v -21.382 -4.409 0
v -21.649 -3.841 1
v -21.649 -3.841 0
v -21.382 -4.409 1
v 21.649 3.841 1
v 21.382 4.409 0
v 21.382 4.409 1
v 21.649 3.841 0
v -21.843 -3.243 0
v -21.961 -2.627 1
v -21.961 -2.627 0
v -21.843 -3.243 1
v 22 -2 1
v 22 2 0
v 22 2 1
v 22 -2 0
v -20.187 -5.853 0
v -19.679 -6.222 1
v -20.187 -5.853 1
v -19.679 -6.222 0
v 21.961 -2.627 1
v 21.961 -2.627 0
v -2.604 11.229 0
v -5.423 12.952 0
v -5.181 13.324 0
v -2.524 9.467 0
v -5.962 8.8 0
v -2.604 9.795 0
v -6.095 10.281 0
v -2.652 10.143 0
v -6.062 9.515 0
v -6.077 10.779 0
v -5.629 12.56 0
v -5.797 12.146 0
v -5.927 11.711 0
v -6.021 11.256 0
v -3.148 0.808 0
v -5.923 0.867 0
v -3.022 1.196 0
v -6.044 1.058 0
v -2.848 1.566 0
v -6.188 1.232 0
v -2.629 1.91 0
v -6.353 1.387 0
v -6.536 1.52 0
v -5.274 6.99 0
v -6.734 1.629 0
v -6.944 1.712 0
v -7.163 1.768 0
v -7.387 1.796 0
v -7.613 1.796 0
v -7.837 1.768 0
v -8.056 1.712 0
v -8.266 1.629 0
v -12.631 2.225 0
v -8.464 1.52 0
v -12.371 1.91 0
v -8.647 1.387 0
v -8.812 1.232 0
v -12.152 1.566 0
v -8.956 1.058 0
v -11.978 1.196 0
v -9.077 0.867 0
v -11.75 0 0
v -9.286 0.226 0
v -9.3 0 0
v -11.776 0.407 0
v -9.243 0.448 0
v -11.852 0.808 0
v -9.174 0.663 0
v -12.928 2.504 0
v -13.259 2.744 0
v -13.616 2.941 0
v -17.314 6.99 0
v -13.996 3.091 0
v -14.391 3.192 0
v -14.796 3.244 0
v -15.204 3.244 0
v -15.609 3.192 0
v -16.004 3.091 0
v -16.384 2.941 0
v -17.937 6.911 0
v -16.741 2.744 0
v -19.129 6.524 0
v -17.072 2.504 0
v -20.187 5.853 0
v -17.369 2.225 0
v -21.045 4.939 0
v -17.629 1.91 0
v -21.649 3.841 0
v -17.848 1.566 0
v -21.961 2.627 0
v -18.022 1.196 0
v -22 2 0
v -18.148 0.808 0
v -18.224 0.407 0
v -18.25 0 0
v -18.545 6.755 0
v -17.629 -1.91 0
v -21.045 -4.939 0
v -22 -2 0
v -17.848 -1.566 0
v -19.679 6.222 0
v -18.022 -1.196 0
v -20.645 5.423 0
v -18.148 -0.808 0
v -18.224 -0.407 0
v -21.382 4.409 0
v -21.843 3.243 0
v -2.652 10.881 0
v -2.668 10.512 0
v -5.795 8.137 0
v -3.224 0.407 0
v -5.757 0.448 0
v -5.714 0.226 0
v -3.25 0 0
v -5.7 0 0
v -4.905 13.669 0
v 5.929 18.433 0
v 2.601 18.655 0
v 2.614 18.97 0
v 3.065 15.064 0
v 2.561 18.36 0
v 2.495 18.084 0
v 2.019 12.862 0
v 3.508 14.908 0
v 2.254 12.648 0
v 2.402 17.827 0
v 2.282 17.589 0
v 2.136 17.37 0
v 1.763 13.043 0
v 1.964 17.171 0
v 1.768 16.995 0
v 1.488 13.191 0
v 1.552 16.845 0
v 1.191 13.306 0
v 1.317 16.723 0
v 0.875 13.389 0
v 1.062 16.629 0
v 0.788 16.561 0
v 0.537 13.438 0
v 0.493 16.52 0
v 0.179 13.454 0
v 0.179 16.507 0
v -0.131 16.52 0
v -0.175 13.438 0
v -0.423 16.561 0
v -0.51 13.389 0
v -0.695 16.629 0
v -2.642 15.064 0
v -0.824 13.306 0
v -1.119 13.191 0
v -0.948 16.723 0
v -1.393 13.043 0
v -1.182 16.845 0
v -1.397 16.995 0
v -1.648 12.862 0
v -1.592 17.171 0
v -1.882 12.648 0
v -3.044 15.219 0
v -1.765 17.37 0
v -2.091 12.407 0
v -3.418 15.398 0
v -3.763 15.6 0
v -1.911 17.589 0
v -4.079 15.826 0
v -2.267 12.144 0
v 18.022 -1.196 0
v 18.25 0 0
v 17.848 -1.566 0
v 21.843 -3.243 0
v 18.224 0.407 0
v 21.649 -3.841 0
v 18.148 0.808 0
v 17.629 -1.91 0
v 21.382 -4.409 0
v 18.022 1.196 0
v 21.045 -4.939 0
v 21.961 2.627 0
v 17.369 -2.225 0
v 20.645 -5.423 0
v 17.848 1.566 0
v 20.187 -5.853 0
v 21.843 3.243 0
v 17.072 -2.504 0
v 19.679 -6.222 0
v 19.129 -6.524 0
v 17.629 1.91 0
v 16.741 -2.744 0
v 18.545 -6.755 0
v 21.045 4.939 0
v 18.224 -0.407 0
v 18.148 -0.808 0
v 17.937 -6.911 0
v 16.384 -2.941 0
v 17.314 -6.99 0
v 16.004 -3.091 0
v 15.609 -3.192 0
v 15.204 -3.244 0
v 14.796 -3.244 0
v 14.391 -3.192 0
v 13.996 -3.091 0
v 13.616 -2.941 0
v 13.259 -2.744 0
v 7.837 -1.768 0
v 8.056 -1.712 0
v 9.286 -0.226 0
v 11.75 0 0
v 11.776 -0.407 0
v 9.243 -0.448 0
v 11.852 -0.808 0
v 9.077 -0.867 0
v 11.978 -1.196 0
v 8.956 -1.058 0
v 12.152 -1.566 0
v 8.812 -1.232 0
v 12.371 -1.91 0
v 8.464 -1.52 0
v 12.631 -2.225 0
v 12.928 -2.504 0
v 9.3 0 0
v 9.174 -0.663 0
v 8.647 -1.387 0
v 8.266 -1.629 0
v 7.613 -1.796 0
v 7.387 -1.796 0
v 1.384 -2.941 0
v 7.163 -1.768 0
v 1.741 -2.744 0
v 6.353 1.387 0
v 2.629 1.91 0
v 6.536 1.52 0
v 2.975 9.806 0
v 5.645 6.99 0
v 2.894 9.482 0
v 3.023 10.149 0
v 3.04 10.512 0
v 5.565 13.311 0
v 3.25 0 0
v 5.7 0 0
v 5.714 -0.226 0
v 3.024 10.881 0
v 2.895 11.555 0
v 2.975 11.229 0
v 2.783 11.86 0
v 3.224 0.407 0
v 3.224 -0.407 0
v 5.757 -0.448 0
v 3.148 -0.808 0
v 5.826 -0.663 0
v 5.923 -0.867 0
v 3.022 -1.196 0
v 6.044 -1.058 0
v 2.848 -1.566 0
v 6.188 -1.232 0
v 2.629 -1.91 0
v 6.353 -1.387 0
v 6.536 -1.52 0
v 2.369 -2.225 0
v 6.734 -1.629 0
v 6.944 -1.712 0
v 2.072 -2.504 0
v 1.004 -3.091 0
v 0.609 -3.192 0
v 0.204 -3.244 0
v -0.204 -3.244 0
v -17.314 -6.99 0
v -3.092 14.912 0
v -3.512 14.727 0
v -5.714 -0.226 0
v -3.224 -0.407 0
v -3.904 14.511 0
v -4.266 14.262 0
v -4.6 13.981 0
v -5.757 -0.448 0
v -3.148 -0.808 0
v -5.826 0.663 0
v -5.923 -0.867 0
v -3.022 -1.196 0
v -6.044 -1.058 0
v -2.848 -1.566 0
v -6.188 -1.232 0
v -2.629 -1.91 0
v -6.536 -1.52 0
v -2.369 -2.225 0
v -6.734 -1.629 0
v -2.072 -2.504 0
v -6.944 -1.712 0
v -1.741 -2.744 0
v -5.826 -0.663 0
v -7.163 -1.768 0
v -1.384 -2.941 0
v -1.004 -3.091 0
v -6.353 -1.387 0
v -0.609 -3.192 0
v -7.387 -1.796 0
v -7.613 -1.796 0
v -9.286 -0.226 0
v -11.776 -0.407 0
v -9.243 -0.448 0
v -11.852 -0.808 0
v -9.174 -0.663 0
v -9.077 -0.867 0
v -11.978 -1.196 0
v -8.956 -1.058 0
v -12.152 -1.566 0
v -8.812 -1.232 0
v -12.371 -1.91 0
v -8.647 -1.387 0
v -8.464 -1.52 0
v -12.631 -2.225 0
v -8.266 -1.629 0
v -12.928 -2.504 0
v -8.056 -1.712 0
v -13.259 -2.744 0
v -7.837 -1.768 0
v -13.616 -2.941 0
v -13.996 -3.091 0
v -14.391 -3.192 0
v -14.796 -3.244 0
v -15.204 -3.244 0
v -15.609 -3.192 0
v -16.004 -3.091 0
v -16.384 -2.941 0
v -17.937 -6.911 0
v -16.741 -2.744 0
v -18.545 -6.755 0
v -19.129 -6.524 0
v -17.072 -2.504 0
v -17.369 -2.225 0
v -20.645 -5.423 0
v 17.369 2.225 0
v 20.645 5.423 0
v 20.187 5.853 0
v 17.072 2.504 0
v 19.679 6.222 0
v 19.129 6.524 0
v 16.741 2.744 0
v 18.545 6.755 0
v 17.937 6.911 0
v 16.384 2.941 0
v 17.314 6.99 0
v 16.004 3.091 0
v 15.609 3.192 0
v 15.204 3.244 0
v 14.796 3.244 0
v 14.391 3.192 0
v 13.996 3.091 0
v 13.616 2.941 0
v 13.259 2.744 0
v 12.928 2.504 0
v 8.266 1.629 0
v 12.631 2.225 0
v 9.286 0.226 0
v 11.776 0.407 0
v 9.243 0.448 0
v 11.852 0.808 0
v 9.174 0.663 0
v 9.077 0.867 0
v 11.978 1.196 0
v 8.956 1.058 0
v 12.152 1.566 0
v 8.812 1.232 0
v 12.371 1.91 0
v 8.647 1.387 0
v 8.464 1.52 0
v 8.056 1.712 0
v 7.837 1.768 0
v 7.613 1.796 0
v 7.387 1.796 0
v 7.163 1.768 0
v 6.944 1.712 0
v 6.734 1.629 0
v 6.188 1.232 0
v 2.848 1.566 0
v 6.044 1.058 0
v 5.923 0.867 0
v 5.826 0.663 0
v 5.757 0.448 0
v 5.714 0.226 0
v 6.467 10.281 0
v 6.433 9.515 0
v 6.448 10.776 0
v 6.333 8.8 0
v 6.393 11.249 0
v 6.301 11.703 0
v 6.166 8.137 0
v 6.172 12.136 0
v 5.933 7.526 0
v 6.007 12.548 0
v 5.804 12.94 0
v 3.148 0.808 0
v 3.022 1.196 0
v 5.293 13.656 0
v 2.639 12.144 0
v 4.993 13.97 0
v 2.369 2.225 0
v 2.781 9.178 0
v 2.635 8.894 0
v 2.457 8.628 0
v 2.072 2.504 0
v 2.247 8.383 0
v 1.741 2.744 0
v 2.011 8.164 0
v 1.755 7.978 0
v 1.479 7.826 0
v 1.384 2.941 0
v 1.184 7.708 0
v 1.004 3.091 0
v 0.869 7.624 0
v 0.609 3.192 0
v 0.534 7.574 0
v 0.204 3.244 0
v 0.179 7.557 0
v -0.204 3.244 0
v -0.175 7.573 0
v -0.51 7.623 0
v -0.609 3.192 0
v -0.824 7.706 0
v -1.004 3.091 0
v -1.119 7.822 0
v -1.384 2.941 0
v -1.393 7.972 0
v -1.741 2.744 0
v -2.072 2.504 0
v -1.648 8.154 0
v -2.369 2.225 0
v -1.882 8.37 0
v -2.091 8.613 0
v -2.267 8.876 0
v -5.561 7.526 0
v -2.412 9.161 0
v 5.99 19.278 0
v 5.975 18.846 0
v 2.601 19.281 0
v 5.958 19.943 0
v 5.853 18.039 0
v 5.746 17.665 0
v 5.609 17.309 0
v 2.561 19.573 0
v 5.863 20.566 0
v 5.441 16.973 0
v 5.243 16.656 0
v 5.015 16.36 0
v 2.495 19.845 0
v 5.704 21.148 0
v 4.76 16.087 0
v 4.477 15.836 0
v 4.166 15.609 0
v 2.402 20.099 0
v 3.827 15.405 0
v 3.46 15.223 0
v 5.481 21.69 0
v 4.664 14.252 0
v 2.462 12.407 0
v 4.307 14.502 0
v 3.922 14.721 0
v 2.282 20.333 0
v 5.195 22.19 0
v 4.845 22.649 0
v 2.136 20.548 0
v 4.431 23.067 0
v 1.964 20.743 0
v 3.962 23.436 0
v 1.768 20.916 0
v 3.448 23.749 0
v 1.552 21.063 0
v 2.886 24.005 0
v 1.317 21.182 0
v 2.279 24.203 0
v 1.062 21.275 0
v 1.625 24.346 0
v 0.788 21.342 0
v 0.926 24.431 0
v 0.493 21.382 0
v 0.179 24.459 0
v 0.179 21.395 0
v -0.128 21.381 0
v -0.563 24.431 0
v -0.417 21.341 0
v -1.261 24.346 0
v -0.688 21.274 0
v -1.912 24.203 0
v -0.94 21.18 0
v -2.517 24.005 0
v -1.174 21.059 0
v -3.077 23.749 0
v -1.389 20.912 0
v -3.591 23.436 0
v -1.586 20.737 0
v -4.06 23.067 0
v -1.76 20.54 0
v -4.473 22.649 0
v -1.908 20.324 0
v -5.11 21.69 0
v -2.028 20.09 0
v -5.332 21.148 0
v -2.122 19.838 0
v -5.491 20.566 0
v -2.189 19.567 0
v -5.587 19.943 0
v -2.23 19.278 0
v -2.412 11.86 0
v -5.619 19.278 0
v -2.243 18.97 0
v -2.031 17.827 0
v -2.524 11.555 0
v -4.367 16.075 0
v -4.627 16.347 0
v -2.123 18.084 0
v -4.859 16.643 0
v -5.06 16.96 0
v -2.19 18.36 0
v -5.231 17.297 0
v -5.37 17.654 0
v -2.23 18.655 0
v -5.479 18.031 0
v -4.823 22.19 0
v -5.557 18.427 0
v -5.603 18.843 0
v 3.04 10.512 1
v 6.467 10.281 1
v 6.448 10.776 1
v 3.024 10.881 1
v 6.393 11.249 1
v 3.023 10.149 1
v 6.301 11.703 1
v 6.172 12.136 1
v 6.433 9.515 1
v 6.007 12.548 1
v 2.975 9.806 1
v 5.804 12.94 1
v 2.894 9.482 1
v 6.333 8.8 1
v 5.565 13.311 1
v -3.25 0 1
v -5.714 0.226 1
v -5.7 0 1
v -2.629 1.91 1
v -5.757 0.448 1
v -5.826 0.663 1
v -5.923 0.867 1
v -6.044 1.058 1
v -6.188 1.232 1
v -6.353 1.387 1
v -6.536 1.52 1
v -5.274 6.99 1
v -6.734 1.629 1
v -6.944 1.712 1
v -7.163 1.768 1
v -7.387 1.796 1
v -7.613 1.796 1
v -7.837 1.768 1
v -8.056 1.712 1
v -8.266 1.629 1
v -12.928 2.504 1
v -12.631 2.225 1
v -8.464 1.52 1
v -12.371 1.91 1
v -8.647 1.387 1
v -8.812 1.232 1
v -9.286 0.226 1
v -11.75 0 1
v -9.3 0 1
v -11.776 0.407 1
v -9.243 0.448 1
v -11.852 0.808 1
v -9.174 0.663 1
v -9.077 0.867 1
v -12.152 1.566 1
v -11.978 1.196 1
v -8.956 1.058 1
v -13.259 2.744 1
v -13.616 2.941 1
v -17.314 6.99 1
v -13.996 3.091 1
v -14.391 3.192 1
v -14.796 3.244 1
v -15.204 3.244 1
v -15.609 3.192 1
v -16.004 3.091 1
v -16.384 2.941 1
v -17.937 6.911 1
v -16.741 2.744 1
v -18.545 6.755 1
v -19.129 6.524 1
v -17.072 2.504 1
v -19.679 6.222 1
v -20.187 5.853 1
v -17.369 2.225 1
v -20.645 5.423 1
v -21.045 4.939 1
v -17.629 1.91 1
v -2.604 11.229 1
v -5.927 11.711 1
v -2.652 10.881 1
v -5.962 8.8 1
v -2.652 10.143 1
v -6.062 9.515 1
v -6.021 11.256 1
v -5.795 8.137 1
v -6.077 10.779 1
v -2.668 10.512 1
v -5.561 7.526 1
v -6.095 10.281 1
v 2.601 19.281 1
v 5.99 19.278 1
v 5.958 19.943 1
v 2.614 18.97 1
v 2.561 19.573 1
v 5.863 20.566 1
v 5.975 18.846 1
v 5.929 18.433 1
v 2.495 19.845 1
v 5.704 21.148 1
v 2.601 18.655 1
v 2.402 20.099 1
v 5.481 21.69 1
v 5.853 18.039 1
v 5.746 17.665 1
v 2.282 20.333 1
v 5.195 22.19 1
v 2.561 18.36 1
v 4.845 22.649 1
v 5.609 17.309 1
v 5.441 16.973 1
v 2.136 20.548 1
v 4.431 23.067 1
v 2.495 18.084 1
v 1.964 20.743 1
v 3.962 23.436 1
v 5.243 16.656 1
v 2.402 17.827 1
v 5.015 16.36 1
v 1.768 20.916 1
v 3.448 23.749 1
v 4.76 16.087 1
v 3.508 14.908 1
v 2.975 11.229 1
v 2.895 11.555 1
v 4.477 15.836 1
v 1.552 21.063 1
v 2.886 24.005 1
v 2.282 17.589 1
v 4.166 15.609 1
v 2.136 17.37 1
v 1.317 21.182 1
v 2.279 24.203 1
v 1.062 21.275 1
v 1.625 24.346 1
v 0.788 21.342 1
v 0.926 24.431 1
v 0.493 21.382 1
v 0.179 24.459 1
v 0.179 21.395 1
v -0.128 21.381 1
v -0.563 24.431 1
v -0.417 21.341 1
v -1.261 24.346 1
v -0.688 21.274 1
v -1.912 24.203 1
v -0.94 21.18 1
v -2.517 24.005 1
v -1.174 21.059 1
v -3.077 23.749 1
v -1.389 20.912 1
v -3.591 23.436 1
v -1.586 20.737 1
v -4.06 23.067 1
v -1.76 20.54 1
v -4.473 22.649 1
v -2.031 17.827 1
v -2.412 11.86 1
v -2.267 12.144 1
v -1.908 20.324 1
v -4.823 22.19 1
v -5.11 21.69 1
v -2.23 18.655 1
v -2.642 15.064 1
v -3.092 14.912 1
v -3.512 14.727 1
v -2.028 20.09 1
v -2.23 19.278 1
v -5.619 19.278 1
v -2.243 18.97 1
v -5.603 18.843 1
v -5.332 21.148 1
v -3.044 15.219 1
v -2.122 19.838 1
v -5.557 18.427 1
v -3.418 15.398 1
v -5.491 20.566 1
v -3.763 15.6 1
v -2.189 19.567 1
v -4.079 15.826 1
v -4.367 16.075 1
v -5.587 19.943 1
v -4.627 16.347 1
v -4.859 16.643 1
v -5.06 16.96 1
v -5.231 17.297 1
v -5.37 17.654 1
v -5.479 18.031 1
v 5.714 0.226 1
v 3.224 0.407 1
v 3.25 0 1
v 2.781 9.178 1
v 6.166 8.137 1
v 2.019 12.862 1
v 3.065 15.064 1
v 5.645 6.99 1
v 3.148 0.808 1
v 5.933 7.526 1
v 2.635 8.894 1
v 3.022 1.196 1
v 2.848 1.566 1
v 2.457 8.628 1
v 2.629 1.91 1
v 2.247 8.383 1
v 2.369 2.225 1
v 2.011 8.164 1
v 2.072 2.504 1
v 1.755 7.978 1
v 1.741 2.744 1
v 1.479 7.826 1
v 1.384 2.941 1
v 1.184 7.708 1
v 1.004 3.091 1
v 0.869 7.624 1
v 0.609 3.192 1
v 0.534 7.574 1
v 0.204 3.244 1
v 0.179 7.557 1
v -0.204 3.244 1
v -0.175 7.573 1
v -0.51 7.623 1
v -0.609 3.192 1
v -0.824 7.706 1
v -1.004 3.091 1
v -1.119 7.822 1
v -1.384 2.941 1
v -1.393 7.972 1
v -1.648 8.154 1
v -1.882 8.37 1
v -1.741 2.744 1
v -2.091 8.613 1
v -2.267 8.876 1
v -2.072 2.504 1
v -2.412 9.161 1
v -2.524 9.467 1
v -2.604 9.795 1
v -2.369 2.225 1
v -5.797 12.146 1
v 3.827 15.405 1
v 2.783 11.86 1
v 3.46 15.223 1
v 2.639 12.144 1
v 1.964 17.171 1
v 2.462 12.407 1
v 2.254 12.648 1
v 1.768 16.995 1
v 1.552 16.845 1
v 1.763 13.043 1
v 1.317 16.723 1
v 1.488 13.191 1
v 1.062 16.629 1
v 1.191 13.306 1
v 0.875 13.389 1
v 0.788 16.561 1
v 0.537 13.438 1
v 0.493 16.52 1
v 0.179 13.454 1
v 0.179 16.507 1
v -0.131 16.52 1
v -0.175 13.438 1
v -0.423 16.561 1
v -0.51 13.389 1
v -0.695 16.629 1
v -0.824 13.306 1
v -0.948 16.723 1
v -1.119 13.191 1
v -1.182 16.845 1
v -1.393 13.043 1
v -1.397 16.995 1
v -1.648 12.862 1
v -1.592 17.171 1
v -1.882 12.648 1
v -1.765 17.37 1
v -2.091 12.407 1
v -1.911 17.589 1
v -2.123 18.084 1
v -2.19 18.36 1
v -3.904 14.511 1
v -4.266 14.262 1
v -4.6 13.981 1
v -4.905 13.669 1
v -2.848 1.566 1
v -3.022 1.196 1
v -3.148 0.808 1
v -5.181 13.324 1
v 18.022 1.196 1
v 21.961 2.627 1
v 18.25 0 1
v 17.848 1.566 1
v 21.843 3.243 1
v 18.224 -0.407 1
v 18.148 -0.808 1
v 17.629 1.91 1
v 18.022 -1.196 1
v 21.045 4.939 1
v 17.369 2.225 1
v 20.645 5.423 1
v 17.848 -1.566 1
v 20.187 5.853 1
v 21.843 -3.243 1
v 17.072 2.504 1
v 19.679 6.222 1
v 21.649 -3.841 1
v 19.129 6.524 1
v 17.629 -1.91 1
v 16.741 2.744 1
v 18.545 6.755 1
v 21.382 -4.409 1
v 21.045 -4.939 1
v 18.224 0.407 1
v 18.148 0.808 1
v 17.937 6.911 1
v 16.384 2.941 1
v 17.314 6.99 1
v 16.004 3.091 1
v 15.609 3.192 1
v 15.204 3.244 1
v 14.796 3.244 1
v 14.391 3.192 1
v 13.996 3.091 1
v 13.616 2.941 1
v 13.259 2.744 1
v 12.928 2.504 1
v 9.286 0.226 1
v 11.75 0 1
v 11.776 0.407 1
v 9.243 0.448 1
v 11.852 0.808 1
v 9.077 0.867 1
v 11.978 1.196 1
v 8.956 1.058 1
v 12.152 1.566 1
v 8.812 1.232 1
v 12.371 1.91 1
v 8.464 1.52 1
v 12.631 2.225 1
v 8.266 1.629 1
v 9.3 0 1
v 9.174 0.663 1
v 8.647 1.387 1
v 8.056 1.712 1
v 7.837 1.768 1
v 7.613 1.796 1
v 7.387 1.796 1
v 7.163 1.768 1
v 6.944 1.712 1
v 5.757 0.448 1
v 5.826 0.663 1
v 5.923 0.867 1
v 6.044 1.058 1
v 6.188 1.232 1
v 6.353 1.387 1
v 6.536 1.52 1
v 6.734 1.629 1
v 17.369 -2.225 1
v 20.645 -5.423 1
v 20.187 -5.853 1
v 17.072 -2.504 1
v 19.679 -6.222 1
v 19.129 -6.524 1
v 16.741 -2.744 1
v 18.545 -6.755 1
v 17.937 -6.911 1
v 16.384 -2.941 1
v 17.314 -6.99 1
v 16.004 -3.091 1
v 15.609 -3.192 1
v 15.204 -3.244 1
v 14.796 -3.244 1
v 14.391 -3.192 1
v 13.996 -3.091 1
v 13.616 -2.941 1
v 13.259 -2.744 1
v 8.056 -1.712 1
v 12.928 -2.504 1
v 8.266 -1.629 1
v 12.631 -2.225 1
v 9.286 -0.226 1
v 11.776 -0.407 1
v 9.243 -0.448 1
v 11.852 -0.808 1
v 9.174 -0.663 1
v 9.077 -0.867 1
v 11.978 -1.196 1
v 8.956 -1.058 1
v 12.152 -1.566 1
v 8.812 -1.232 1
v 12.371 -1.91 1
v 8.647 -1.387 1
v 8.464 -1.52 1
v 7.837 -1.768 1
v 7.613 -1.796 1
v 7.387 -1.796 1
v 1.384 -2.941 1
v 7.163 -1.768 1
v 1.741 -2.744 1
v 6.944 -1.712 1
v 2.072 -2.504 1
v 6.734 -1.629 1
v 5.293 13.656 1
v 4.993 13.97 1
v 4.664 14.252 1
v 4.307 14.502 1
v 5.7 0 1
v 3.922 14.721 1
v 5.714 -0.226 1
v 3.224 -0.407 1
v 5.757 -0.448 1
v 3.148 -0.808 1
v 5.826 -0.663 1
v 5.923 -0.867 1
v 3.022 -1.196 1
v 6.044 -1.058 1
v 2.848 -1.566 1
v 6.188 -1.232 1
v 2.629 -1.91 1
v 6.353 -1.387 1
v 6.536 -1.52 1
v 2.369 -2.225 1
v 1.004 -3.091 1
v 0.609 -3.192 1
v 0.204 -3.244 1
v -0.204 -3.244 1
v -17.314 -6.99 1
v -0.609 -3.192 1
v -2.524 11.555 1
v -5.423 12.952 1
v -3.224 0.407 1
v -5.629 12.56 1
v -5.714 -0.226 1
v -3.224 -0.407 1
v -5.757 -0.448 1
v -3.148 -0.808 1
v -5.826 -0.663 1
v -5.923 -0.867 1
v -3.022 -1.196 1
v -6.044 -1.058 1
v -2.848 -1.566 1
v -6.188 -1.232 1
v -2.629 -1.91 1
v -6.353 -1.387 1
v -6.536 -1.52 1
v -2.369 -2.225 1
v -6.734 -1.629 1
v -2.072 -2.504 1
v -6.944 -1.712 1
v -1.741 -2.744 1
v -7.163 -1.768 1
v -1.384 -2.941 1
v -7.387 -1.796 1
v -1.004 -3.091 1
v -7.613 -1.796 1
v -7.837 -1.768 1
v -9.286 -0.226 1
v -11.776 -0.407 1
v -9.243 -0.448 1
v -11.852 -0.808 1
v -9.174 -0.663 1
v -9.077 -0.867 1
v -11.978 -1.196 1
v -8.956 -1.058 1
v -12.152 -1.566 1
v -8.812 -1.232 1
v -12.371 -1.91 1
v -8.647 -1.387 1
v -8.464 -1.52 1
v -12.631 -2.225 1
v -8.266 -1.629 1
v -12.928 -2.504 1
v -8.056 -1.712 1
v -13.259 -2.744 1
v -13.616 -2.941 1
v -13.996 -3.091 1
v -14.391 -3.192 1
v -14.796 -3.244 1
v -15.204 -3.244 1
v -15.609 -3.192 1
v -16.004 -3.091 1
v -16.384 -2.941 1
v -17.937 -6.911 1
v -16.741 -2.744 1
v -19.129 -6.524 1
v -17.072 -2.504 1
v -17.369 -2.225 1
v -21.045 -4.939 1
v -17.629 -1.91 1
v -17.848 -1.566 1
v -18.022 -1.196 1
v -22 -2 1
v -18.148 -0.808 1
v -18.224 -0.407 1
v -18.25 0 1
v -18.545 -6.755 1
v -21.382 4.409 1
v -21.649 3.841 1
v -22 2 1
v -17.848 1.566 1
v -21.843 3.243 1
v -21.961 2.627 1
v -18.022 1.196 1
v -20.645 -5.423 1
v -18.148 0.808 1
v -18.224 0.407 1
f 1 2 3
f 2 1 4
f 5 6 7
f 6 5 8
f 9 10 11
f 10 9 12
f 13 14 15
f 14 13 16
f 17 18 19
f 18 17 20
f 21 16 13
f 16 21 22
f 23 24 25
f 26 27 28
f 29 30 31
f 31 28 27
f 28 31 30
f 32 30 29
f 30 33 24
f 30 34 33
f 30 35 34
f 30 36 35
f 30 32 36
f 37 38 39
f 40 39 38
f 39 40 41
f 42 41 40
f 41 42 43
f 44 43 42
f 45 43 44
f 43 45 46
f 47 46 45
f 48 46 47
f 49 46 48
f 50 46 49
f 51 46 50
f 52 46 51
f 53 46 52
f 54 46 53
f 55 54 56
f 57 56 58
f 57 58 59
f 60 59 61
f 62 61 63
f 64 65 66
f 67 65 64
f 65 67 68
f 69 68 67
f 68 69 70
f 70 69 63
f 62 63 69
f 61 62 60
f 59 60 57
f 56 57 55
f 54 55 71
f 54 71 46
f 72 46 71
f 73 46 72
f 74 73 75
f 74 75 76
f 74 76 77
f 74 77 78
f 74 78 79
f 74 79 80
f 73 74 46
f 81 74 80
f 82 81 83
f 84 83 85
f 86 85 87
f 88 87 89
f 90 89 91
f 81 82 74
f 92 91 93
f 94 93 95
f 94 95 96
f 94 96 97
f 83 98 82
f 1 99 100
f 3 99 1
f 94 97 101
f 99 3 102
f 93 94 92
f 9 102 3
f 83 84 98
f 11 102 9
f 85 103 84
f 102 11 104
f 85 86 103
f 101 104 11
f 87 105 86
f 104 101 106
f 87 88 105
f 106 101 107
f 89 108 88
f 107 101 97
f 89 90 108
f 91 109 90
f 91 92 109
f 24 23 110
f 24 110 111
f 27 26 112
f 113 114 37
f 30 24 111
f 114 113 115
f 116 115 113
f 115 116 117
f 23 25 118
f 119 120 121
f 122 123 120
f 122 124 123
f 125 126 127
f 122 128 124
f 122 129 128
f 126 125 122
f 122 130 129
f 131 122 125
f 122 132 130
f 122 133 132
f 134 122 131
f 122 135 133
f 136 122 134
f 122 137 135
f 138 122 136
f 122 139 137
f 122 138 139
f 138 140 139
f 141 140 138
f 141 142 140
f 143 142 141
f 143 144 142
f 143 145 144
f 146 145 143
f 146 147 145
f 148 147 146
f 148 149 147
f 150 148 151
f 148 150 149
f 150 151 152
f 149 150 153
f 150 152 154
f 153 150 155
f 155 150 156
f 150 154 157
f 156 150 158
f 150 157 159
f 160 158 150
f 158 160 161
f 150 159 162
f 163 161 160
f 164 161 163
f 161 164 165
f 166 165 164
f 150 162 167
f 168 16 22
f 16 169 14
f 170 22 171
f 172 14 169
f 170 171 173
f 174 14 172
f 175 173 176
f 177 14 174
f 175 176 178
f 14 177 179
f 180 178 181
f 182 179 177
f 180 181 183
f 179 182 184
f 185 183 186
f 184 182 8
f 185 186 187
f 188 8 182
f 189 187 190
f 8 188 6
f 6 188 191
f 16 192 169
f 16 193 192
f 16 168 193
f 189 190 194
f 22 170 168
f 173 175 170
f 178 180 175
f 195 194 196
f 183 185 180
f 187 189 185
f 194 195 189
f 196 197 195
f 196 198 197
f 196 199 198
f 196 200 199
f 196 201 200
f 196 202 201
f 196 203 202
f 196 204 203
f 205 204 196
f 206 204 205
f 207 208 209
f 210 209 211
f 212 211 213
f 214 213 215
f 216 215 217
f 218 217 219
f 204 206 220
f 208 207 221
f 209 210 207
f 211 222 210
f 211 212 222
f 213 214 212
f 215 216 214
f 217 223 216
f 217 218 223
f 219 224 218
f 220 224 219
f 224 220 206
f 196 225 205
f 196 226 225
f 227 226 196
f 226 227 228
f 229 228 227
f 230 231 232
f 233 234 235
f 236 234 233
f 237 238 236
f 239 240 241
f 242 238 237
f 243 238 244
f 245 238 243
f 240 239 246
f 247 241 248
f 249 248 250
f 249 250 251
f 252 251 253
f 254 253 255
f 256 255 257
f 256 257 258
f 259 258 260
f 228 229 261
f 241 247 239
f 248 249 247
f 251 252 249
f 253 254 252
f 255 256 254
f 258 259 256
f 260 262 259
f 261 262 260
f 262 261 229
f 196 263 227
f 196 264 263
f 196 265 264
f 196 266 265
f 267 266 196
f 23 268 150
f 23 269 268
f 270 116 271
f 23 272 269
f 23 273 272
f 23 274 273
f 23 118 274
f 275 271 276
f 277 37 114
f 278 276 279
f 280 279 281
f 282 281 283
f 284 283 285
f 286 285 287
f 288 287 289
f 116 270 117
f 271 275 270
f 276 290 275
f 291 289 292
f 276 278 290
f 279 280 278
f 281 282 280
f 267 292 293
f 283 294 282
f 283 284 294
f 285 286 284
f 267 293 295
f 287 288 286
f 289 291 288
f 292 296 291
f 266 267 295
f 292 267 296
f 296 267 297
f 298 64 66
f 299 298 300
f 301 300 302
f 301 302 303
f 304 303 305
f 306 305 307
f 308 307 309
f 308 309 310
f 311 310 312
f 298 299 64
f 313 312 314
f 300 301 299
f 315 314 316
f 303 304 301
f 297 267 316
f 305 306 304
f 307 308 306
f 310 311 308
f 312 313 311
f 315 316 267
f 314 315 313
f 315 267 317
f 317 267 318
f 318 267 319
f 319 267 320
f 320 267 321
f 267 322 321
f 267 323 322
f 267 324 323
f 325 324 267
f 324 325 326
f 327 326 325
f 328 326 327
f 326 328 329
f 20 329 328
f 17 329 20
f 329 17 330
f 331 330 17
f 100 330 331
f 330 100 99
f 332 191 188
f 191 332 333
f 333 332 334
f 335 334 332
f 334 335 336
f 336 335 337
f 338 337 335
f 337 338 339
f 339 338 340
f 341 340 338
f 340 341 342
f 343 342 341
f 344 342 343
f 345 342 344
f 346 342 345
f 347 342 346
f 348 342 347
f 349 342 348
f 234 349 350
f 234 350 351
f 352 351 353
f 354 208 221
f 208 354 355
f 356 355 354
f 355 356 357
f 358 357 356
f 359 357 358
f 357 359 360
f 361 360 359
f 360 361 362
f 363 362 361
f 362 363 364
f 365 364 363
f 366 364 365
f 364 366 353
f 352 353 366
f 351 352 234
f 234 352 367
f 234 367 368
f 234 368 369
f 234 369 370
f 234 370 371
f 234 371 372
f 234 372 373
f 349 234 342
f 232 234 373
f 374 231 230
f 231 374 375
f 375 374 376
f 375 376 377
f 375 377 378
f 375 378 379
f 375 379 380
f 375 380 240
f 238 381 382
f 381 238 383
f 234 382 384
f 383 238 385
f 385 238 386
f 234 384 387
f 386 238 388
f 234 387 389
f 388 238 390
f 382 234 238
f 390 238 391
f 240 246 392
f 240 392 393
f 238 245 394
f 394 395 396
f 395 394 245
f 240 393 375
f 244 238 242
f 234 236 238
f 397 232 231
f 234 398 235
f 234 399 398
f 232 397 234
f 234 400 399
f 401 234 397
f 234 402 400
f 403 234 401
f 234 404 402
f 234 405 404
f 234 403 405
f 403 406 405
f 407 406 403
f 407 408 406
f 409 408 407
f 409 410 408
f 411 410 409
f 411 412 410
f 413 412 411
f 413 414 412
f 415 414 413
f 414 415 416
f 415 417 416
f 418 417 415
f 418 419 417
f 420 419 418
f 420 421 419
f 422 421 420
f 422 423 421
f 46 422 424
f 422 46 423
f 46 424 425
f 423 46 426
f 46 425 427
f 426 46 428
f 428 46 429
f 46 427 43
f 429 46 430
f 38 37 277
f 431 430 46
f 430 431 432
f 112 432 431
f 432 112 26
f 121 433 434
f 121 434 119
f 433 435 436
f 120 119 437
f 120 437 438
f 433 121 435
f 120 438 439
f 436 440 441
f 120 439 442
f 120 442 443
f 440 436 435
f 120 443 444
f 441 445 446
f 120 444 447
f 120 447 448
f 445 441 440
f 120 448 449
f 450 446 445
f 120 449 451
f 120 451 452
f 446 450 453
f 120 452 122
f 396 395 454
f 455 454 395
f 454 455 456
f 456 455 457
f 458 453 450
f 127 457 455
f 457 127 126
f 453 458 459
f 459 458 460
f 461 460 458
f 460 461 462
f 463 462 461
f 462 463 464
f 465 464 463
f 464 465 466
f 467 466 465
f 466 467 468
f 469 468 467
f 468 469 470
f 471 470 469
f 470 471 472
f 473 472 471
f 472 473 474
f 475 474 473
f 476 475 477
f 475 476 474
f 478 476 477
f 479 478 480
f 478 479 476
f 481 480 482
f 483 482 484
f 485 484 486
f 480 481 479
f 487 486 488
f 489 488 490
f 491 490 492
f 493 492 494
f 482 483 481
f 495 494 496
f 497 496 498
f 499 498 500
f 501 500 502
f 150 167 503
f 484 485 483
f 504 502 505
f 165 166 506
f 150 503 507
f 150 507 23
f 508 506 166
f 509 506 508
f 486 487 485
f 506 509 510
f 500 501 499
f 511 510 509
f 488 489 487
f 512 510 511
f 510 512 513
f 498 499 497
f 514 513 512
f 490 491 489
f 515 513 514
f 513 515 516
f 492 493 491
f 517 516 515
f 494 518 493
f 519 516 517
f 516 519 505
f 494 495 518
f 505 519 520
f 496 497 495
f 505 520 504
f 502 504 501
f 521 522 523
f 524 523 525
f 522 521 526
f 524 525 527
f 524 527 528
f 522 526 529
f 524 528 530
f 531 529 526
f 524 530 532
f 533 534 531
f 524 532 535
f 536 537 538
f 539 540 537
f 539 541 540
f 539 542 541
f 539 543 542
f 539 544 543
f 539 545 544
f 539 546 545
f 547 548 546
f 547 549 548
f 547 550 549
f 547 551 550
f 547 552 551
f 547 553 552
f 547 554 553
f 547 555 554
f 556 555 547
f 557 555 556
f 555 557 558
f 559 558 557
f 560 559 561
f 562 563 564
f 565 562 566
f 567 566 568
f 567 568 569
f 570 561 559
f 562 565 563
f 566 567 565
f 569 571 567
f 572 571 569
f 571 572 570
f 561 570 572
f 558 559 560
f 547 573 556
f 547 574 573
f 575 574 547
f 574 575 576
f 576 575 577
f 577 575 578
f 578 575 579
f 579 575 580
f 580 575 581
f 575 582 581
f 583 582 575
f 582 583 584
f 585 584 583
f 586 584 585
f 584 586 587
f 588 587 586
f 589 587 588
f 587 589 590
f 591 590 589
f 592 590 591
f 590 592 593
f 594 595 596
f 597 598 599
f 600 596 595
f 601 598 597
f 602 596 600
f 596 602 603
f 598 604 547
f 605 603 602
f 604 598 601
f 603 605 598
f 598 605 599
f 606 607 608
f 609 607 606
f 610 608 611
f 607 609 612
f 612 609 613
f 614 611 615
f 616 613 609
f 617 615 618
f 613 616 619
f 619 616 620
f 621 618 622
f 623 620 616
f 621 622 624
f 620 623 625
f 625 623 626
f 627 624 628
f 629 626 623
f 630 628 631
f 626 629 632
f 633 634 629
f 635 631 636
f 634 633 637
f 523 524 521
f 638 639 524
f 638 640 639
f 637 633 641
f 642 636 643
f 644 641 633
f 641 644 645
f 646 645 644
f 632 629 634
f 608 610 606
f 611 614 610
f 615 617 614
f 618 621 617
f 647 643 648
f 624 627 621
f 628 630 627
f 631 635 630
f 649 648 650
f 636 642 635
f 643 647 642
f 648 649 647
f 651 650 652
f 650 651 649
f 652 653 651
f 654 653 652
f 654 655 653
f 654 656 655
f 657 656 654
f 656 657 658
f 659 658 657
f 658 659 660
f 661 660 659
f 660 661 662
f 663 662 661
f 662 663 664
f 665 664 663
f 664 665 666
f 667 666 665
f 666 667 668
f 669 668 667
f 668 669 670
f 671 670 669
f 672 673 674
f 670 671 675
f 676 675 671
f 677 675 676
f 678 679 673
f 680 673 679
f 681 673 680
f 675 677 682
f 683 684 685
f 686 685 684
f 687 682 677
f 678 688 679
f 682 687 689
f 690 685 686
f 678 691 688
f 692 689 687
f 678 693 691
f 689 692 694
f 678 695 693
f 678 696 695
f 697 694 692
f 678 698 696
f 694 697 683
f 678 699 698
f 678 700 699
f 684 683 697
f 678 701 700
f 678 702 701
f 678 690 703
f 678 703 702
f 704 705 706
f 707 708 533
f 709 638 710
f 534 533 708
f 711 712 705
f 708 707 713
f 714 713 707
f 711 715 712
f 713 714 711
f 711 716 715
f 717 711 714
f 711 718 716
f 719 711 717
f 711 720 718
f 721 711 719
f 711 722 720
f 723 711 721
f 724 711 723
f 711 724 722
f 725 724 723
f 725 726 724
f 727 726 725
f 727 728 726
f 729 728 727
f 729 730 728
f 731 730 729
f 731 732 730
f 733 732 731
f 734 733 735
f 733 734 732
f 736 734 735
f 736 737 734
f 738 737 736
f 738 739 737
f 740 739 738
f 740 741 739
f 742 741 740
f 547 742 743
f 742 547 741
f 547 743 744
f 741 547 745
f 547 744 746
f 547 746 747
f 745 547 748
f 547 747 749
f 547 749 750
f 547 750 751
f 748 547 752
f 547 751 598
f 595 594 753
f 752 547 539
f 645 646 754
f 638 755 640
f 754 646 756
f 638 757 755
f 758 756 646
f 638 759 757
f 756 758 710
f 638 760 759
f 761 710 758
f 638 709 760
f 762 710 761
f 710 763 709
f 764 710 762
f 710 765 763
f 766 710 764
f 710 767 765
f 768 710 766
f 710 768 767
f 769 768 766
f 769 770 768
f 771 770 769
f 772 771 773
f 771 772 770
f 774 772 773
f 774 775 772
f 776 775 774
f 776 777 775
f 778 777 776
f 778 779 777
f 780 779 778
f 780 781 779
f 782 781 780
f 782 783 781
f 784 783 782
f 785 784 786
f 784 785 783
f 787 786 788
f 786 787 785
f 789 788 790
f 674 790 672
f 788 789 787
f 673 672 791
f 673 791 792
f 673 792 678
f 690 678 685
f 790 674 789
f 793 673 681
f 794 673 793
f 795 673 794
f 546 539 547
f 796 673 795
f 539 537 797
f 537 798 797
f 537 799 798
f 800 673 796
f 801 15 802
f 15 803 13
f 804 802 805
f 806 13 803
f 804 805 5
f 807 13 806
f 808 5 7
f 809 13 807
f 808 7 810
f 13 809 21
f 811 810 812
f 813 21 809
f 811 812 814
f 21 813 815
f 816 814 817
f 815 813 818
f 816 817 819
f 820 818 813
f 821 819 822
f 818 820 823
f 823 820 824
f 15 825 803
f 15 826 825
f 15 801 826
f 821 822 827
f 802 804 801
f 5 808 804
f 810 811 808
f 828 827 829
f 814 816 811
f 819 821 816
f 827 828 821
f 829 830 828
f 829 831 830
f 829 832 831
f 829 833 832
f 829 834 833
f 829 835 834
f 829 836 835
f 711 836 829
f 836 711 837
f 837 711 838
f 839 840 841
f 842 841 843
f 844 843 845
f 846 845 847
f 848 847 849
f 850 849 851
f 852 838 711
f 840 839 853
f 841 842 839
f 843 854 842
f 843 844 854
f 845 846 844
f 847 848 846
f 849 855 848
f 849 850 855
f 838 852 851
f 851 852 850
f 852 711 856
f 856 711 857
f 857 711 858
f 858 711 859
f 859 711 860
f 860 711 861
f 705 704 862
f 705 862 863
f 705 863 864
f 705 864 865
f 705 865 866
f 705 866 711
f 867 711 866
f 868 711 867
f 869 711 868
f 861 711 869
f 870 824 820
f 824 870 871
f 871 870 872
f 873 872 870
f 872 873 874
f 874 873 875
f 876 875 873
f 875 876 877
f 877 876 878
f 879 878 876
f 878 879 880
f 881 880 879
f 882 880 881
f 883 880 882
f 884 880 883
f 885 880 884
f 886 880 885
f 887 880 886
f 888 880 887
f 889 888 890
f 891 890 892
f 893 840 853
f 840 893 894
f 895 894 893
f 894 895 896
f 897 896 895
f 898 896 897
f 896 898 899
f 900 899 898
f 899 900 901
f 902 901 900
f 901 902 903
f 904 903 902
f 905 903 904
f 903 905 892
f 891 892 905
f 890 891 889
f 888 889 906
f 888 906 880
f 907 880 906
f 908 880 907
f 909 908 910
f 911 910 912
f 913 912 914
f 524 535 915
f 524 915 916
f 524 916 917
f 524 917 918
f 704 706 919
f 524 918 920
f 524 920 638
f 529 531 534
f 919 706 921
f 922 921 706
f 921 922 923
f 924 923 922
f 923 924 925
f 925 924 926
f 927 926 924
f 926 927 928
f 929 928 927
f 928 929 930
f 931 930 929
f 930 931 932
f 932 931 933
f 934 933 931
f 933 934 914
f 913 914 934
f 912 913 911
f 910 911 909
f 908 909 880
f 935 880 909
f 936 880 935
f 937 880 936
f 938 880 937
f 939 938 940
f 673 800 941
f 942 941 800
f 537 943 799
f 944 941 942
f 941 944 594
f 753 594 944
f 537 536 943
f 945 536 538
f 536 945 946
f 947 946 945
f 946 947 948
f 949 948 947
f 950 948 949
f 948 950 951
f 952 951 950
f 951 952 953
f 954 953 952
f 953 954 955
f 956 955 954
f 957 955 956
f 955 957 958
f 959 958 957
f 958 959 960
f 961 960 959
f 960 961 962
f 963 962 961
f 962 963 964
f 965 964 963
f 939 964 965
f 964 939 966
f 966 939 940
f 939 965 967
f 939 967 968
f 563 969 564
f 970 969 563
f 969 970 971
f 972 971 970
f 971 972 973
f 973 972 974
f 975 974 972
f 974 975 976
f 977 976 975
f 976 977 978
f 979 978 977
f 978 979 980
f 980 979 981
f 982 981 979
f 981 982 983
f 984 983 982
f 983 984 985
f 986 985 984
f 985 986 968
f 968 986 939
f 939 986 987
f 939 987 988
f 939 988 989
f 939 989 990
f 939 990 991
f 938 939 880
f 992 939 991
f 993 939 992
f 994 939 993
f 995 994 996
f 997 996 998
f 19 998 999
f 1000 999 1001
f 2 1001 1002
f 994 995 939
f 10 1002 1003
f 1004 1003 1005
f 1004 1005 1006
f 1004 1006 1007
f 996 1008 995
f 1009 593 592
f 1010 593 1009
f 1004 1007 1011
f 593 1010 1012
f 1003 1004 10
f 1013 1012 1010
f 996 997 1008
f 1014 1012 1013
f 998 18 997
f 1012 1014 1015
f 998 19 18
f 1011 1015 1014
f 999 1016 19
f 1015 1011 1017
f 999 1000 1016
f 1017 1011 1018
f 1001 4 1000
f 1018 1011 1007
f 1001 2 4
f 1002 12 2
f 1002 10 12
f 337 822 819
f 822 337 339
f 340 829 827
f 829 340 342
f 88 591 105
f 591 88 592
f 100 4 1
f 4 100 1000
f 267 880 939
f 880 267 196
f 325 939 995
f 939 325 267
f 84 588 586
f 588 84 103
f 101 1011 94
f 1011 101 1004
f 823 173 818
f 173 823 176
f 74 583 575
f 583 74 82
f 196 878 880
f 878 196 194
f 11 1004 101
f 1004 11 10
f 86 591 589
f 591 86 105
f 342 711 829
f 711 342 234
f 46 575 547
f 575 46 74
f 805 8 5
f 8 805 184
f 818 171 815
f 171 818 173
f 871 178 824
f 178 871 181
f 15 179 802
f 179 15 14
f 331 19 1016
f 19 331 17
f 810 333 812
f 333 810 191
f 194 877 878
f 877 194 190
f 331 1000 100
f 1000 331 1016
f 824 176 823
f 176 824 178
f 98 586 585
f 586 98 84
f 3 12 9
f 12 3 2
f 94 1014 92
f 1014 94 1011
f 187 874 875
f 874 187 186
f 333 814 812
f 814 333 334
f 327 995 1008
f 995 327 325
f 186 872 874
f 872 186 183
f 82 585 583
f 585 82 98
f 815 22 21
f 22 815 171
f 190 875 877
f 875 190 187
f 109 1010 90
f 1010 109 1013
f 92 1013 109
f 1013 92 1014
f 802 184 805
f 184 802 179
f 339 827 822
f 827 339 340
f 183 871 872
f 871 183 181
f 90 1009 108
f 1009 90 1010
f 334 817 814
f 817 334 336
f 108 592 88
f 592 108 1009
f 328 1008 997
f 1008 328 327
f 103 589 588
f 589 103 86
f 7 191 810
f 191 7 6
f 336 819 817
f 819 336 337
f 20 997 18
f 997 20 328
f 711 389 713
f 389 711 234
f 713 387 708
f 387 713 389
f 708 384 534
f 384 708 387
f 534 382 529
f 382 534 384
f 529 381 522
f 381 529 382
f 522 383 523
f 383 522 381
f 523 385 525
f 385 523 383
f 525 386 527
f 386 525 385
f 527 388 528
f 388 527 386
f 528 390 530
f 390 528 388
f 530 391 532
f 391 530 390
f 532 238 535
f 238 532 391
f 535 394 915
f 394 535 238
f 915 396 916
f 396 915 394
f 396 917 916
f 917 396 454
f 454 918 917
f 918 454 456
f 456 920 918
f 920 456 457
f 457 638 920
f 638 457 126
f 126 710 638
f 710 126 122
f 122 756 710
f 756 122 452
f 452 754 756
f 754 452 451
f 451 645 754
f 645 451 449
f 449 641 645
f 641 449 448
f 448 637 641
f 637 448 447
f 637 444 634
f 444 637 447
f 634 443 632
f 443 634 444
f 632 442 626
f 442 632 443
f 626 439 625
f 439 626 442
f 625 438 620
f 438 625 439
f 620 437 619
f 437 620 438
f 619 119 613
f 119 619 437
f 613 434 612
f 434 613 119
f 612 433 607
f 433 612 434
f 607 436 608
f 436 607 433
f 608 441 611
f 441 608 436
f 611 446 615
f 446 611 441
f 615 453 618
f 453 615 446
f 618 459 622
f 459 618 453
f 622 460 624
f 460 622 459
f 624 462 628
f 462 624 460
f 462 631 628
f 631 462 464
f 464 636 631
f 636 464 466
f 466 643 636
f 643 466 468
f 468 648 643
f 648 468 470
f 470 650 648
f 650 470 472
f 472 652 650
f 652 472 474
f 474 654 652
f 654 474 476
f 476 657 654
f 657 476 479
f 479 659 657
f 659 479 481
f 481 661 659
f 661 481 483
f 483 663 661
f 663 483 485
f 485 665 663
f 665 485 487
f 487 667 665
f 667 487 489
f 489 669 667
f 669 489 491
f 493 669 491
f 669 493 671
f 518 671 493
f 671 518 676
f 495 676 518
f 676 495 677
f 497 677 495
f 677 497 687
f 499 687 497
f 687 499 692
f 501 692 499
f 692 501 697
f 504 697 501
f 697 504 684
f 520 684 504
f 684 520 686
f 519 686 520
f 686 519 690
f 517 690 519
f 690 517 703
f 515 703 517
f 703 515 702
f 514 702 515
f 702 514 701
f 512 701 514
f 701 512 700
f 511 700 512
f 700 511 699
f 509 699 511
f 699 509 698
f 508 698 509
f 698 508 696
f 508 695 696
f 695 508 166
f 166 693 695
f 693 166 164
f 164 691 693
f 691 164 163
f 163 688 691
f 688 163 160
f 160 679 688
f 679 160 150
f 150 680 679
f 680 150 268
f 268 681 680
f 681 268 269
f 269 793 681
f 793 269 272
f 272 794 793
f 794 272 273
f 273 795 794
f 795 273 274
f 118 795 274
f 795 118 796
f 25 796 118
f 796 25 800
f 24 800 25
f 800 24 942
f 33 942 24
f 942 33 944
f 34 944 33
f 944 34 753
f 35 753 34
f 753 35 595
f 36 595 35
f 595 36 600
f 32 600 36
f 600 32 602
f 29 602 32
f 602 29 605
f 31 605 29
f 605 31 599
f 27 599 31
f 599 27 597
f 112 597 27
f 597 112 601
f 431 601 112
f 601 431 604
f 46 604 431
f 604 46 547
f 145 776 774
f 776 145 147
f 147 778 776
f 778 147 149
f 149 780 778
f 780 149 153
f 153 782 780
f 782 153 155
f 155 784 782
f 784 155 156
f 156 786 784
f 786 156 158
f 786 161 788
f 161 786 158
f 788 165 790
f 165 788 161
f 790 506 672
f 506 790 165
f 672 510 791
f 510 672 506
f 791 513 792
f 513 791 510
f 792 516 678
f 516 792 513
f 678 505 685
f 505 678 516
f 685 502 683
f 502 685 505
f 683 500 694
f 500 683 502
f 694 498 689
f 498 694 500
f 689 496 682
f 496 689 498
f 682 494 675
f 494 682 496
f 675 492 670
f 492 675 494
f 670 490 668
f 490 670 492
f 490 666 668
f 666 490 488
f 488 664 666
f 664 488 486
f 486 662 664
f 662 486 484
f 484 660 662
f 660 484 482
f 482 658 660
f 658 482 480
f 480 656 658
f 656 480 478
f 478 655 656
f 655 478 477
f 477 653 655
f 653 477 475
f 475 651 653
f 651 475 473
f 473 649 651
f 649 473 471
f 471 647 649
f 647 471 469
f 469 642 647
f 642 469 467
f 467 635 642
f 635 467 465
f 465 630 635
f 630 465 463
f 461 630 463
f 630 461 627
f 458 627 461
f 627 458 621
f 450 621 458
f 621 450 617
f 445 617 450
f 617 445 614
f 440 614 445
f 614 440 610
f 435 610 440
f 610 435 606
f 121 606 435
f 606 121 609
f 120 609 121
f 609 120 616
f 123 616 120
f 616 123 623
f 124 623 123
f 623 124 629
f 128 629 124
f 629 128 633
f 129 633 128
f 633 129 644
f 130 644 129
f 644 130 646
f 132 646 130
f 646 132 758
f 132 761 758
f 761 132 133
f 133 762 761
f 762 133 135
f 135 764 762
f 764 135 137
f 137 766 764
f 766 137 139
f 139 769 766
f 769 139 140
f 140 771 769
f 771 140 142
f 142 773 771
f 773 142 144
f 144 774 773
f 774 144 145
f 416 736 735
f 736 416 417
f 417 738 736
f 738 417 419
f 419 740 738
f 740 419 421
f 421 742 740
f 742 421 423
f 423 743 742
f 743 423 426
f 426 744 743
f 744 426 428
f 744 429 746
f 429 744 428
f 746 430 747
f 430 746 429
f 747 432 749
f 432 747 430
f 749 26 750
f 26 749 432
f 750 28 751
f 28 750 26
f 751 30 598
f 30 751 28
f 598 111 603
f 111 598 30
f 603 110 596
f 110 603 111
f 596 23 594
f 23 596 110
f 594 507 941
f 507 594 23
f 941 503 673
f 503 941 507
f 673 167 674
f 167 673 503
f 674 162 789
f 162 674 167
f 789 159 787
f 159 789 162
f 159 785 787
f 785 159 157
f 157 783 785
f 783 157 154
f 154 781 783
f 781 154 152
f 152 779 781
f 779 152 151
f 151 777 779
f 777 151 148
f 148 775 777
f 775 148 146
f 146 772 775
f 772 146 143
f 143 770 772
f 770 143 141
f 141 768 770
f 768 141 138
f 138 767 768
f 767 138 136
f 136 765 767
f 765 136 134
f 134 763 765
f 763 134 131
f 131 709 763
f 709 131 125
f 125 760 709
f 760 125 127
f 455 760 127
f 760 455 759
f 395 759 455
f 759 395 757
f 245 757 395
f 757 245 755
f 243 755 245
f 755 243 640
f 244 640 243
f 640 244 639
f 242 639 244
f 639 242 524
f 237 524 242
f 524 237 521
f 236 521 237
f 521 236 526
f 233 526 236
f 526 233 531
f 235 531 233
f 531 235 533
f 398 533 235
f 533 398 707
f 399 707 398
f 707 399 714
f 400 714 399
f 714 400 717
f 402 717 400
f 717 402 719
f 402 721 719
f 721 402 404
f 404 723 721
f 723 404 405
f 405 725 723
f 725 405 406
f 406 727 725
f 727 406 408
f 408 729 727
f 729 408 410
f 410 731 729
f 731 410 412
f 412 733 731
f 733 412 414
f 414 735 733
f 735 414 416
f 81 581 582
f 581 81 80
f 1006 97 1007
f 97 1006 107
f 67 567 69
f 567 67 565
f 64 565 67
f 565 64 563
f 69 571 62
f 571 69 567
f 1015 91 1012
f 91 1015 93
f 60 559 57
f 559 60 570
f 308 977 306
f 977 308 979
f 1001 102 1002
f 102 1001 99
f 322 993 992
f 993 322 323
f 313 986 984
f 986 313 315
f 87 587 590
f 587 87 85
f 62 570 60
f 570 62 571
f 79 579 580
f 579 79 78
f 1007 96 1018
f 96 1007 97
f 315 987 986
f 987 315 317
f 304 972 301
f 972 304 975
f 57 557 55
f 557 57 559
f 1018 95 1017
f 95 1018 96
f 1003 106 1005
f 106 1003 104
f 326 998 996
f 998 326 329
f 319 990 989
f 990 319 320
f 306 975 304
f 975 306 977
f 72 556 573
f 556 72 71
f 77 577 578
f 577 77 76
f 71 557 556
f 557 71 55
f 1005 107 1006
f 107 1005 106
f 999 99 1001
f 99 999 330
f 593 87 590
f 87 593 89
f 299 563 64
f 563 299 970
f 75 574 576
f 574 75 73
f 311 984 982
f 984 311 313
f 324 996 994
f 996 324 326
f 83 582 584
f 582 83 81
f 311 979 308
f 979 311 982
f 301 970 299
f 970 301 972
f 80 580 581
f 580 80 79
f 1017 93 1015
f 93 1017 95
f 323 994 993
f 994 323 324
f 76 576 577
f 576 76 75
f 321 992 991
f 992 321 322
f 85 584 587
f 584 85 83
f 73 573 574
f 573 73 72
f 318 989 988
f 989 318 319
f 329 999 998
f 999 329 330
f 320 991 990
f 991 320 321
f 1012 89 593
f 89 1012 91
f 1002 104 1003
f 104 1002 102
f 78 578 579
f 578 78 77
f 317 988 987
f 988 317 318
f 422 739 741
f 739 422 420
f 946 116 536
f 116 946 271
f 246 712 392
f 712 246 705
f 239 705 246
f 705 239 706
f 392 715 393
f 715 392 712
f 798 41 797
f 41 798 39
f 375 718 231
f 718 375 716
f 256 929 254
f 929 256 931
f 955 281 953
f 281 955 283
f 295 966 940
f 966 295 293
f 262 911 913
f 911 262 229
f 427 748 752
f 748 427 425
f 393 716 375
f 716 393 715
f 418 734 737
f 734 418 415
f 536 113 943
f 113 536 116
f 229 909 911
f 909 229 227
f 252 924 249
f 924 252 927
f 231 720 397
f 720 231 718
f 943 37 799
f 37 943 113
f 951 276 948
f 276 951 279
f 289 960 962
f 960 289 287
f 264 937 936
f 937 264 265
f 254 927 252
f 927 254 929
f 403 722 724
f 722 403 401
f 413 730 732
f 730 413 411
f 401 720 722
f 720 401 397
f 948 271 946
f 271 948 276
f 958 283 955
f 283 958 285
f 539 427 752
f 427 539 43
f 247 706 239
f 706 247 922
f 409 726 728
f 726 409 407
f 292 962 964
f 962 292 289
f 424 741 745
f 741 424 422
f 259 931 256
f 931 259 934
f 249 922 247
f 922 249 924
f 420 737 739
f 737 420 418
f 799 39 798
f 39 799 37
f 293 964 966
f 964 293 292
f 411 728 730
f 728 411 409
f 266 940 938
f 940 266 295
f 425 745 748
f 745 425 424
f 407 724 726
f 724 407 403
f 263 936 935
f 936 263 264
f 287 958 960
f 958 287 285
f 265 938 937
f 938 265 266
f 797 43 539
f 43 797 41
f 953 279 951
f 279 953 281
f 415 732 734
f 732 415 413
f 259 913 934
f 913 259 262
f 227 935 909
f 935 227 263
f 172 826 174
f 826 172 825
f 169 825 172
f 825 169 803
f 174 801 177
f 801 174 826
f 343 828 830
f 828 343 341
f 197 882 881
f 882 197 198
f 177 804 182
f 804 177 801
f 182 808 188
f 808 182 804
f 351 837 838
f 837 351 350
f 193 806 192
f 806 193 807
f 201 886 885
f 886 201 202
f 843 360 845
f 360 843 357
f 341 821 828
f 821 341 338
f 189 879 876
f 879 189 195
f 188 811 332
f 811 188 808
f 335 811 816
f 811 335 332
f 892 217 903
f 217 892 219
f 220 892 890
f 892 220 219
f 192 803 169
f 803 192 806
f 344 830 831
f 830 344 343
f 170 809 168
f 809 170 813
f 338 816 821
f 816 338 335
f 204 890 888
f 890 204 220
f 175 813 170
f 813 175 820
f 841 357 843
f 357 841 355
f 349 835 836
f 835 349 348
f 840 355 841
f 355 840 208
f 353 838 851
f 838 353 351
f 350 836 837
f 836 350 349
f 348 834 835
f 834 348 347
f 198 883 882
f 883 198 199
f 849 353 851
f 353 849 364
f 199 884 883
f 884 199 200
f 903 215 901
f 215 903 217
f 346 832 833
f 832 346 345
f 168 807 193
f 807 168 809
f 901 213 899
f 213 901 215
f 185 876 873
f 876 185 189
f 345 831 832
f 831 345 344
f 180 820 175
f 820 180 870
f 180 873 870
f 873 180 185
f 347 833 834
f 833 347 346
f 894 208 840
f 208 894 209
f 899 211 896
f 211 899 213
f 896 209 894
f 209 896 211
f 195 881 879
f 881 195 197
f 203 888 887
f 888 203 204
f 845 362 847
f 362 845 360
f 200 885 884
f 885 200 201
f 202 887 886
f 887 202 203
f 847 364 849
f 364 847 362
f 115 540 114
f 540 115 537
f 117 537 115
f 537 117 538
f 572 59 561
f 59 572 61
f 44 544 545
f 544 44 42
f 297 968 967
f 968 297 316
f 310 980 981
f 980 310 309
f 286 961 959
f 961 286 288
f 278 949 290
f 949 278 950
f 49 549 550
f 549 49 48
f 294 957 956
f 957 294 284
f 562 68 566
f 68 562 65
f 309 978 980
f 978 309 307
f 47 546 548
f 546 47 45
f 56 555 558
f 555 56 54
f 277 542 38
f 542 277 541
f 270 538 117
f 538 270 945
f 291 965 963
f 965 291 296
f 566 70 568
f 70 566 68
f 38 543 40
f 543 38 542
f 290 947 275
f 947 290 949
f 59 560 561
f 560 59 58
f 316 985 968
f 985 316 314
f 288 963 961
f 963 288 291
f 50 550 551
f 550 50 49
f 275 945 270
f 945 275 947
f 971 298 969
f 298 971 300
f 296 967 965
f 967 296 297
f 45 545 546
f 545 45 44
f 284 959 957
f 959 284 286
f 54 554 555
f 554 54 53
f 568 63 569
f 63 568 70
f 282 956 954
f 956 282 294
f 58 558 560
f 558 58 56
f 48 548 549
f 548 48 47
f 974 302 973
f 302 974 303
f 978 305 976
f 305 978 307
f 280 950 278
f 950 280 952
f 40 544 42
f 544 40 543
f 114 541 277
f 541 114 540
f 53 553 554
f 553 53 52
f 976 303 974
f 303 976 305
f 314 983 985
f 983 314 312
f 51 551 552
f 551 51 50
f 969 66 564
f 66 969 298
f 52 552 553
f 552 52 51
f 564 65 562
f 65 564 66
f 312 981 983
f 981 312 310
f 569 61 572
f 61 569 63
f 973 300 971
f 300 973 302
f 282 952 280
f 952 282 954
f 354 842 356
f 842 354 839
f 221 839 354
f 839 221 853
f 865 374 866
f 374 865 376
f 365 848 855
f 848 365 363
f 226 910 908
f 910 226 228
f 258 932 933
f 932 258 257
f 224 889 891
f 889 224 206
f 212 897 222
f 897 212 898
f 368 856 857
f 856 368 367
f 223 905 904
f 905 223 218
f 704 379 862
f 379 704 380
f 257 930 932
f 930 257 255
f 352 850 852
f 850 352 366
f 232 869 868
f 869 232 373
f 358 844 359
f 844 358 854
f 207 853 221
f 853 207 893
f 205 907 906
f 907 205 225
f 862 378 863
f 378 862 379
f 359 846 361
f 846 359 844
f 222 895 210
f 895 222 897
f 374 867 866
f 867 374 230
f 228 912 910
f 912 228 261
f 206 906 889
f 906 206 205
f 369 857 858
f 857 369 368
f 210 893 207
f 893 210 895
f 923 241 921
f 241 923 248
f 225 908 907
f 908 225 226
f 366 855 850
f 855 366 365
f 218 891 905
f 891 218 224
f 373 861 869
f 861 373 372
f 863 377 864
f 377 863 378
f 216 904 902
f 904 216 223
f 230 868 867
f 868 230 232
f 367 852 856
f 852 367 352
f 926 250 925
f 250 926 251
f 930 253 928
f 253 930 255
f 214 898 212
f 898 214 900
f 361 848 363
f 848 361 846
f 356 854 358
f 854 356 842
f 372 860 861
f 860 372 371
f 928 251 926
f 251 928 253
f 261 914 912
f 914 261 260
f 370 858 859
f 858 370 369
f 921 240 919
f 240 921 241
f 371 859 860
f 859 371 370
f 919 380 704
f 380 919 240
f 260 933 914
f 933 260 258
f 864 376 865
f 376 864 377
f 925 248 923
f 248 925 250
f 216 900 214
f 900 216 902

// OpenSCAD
$fn = 50;


difference() {
	union() {
		hull() {
			translate(v = [-17.0000000000, 2.0000000000, 0]) {
				cylinder(h = 1, r = 5);
			}
			translate(v = [17.0000000000, 2.0000000000, 0]) {
				cylinder(h = 1, r = 5);
			}
			translate(v = [-17.0000000000, -2.0000000000, 0]) {
				cylinder(h = 1, r = 5);
			}
			translate(v = [17.0000000000, -2.0000000000, 0]) {
				cylinder(h = 1, r = 5);
			}
		}
		translate(v = [0, 24, 0]) {
			linear_extrude(height = 1) {
				text(font = "DejaVu Sans Mono:style=Bold", halign = "center", size = 19.0000000000, text = "8", valign = "top");
			}
		}
	}
	union() {
		translate(v = [-15.0000000000, 0.0000000000, 0]) {
			translate(v = [0, 0, -100]) {
				cylinder(h = 200, r = 3.2500000000);
			}
		}
		translate(v = [0, 0, -100]) {
			cylinder(h = 200, r = 3.2500000000);
		}
		translate(v = [15.0000000000, 0.0000000000, 0]) {
			translate(v = [0, 0, -100]) {
				cylinder(h = 200, r = 3.2500000000);
			}
		}
		translate(v = [-15.0000000000, 0.0000000000, 0]) {
			translate(v = [0, 0, -100]) {
				cylinder(h = 200, r = 1.8000000000);
			}
		}
		translate(v = [-7.5000000000, 0.0000000000, 0]) {
			translate(v = [0, 0, -100]) {
				cylinder(h = 200, r = 1.8000000000);
			}
		}
		translate(v = [0, 0, -100]) {
			cylinder(h = 200, r = 1.8000000000);
		}
		translate(v = [7.5000000000, 0.0000000000, 0]) {
			translate(v = [0, 0, -100]) {
				cylinder(h = 200, r = 1.8000000000);
			}
		}
		translate(v = [15.0000000000, 0.0000000000, 0]) {
			translate(v = [0, 0, -100]) {
				cylinder(h = 200, r = 1.8000000000);
			}
		}
	}
}
